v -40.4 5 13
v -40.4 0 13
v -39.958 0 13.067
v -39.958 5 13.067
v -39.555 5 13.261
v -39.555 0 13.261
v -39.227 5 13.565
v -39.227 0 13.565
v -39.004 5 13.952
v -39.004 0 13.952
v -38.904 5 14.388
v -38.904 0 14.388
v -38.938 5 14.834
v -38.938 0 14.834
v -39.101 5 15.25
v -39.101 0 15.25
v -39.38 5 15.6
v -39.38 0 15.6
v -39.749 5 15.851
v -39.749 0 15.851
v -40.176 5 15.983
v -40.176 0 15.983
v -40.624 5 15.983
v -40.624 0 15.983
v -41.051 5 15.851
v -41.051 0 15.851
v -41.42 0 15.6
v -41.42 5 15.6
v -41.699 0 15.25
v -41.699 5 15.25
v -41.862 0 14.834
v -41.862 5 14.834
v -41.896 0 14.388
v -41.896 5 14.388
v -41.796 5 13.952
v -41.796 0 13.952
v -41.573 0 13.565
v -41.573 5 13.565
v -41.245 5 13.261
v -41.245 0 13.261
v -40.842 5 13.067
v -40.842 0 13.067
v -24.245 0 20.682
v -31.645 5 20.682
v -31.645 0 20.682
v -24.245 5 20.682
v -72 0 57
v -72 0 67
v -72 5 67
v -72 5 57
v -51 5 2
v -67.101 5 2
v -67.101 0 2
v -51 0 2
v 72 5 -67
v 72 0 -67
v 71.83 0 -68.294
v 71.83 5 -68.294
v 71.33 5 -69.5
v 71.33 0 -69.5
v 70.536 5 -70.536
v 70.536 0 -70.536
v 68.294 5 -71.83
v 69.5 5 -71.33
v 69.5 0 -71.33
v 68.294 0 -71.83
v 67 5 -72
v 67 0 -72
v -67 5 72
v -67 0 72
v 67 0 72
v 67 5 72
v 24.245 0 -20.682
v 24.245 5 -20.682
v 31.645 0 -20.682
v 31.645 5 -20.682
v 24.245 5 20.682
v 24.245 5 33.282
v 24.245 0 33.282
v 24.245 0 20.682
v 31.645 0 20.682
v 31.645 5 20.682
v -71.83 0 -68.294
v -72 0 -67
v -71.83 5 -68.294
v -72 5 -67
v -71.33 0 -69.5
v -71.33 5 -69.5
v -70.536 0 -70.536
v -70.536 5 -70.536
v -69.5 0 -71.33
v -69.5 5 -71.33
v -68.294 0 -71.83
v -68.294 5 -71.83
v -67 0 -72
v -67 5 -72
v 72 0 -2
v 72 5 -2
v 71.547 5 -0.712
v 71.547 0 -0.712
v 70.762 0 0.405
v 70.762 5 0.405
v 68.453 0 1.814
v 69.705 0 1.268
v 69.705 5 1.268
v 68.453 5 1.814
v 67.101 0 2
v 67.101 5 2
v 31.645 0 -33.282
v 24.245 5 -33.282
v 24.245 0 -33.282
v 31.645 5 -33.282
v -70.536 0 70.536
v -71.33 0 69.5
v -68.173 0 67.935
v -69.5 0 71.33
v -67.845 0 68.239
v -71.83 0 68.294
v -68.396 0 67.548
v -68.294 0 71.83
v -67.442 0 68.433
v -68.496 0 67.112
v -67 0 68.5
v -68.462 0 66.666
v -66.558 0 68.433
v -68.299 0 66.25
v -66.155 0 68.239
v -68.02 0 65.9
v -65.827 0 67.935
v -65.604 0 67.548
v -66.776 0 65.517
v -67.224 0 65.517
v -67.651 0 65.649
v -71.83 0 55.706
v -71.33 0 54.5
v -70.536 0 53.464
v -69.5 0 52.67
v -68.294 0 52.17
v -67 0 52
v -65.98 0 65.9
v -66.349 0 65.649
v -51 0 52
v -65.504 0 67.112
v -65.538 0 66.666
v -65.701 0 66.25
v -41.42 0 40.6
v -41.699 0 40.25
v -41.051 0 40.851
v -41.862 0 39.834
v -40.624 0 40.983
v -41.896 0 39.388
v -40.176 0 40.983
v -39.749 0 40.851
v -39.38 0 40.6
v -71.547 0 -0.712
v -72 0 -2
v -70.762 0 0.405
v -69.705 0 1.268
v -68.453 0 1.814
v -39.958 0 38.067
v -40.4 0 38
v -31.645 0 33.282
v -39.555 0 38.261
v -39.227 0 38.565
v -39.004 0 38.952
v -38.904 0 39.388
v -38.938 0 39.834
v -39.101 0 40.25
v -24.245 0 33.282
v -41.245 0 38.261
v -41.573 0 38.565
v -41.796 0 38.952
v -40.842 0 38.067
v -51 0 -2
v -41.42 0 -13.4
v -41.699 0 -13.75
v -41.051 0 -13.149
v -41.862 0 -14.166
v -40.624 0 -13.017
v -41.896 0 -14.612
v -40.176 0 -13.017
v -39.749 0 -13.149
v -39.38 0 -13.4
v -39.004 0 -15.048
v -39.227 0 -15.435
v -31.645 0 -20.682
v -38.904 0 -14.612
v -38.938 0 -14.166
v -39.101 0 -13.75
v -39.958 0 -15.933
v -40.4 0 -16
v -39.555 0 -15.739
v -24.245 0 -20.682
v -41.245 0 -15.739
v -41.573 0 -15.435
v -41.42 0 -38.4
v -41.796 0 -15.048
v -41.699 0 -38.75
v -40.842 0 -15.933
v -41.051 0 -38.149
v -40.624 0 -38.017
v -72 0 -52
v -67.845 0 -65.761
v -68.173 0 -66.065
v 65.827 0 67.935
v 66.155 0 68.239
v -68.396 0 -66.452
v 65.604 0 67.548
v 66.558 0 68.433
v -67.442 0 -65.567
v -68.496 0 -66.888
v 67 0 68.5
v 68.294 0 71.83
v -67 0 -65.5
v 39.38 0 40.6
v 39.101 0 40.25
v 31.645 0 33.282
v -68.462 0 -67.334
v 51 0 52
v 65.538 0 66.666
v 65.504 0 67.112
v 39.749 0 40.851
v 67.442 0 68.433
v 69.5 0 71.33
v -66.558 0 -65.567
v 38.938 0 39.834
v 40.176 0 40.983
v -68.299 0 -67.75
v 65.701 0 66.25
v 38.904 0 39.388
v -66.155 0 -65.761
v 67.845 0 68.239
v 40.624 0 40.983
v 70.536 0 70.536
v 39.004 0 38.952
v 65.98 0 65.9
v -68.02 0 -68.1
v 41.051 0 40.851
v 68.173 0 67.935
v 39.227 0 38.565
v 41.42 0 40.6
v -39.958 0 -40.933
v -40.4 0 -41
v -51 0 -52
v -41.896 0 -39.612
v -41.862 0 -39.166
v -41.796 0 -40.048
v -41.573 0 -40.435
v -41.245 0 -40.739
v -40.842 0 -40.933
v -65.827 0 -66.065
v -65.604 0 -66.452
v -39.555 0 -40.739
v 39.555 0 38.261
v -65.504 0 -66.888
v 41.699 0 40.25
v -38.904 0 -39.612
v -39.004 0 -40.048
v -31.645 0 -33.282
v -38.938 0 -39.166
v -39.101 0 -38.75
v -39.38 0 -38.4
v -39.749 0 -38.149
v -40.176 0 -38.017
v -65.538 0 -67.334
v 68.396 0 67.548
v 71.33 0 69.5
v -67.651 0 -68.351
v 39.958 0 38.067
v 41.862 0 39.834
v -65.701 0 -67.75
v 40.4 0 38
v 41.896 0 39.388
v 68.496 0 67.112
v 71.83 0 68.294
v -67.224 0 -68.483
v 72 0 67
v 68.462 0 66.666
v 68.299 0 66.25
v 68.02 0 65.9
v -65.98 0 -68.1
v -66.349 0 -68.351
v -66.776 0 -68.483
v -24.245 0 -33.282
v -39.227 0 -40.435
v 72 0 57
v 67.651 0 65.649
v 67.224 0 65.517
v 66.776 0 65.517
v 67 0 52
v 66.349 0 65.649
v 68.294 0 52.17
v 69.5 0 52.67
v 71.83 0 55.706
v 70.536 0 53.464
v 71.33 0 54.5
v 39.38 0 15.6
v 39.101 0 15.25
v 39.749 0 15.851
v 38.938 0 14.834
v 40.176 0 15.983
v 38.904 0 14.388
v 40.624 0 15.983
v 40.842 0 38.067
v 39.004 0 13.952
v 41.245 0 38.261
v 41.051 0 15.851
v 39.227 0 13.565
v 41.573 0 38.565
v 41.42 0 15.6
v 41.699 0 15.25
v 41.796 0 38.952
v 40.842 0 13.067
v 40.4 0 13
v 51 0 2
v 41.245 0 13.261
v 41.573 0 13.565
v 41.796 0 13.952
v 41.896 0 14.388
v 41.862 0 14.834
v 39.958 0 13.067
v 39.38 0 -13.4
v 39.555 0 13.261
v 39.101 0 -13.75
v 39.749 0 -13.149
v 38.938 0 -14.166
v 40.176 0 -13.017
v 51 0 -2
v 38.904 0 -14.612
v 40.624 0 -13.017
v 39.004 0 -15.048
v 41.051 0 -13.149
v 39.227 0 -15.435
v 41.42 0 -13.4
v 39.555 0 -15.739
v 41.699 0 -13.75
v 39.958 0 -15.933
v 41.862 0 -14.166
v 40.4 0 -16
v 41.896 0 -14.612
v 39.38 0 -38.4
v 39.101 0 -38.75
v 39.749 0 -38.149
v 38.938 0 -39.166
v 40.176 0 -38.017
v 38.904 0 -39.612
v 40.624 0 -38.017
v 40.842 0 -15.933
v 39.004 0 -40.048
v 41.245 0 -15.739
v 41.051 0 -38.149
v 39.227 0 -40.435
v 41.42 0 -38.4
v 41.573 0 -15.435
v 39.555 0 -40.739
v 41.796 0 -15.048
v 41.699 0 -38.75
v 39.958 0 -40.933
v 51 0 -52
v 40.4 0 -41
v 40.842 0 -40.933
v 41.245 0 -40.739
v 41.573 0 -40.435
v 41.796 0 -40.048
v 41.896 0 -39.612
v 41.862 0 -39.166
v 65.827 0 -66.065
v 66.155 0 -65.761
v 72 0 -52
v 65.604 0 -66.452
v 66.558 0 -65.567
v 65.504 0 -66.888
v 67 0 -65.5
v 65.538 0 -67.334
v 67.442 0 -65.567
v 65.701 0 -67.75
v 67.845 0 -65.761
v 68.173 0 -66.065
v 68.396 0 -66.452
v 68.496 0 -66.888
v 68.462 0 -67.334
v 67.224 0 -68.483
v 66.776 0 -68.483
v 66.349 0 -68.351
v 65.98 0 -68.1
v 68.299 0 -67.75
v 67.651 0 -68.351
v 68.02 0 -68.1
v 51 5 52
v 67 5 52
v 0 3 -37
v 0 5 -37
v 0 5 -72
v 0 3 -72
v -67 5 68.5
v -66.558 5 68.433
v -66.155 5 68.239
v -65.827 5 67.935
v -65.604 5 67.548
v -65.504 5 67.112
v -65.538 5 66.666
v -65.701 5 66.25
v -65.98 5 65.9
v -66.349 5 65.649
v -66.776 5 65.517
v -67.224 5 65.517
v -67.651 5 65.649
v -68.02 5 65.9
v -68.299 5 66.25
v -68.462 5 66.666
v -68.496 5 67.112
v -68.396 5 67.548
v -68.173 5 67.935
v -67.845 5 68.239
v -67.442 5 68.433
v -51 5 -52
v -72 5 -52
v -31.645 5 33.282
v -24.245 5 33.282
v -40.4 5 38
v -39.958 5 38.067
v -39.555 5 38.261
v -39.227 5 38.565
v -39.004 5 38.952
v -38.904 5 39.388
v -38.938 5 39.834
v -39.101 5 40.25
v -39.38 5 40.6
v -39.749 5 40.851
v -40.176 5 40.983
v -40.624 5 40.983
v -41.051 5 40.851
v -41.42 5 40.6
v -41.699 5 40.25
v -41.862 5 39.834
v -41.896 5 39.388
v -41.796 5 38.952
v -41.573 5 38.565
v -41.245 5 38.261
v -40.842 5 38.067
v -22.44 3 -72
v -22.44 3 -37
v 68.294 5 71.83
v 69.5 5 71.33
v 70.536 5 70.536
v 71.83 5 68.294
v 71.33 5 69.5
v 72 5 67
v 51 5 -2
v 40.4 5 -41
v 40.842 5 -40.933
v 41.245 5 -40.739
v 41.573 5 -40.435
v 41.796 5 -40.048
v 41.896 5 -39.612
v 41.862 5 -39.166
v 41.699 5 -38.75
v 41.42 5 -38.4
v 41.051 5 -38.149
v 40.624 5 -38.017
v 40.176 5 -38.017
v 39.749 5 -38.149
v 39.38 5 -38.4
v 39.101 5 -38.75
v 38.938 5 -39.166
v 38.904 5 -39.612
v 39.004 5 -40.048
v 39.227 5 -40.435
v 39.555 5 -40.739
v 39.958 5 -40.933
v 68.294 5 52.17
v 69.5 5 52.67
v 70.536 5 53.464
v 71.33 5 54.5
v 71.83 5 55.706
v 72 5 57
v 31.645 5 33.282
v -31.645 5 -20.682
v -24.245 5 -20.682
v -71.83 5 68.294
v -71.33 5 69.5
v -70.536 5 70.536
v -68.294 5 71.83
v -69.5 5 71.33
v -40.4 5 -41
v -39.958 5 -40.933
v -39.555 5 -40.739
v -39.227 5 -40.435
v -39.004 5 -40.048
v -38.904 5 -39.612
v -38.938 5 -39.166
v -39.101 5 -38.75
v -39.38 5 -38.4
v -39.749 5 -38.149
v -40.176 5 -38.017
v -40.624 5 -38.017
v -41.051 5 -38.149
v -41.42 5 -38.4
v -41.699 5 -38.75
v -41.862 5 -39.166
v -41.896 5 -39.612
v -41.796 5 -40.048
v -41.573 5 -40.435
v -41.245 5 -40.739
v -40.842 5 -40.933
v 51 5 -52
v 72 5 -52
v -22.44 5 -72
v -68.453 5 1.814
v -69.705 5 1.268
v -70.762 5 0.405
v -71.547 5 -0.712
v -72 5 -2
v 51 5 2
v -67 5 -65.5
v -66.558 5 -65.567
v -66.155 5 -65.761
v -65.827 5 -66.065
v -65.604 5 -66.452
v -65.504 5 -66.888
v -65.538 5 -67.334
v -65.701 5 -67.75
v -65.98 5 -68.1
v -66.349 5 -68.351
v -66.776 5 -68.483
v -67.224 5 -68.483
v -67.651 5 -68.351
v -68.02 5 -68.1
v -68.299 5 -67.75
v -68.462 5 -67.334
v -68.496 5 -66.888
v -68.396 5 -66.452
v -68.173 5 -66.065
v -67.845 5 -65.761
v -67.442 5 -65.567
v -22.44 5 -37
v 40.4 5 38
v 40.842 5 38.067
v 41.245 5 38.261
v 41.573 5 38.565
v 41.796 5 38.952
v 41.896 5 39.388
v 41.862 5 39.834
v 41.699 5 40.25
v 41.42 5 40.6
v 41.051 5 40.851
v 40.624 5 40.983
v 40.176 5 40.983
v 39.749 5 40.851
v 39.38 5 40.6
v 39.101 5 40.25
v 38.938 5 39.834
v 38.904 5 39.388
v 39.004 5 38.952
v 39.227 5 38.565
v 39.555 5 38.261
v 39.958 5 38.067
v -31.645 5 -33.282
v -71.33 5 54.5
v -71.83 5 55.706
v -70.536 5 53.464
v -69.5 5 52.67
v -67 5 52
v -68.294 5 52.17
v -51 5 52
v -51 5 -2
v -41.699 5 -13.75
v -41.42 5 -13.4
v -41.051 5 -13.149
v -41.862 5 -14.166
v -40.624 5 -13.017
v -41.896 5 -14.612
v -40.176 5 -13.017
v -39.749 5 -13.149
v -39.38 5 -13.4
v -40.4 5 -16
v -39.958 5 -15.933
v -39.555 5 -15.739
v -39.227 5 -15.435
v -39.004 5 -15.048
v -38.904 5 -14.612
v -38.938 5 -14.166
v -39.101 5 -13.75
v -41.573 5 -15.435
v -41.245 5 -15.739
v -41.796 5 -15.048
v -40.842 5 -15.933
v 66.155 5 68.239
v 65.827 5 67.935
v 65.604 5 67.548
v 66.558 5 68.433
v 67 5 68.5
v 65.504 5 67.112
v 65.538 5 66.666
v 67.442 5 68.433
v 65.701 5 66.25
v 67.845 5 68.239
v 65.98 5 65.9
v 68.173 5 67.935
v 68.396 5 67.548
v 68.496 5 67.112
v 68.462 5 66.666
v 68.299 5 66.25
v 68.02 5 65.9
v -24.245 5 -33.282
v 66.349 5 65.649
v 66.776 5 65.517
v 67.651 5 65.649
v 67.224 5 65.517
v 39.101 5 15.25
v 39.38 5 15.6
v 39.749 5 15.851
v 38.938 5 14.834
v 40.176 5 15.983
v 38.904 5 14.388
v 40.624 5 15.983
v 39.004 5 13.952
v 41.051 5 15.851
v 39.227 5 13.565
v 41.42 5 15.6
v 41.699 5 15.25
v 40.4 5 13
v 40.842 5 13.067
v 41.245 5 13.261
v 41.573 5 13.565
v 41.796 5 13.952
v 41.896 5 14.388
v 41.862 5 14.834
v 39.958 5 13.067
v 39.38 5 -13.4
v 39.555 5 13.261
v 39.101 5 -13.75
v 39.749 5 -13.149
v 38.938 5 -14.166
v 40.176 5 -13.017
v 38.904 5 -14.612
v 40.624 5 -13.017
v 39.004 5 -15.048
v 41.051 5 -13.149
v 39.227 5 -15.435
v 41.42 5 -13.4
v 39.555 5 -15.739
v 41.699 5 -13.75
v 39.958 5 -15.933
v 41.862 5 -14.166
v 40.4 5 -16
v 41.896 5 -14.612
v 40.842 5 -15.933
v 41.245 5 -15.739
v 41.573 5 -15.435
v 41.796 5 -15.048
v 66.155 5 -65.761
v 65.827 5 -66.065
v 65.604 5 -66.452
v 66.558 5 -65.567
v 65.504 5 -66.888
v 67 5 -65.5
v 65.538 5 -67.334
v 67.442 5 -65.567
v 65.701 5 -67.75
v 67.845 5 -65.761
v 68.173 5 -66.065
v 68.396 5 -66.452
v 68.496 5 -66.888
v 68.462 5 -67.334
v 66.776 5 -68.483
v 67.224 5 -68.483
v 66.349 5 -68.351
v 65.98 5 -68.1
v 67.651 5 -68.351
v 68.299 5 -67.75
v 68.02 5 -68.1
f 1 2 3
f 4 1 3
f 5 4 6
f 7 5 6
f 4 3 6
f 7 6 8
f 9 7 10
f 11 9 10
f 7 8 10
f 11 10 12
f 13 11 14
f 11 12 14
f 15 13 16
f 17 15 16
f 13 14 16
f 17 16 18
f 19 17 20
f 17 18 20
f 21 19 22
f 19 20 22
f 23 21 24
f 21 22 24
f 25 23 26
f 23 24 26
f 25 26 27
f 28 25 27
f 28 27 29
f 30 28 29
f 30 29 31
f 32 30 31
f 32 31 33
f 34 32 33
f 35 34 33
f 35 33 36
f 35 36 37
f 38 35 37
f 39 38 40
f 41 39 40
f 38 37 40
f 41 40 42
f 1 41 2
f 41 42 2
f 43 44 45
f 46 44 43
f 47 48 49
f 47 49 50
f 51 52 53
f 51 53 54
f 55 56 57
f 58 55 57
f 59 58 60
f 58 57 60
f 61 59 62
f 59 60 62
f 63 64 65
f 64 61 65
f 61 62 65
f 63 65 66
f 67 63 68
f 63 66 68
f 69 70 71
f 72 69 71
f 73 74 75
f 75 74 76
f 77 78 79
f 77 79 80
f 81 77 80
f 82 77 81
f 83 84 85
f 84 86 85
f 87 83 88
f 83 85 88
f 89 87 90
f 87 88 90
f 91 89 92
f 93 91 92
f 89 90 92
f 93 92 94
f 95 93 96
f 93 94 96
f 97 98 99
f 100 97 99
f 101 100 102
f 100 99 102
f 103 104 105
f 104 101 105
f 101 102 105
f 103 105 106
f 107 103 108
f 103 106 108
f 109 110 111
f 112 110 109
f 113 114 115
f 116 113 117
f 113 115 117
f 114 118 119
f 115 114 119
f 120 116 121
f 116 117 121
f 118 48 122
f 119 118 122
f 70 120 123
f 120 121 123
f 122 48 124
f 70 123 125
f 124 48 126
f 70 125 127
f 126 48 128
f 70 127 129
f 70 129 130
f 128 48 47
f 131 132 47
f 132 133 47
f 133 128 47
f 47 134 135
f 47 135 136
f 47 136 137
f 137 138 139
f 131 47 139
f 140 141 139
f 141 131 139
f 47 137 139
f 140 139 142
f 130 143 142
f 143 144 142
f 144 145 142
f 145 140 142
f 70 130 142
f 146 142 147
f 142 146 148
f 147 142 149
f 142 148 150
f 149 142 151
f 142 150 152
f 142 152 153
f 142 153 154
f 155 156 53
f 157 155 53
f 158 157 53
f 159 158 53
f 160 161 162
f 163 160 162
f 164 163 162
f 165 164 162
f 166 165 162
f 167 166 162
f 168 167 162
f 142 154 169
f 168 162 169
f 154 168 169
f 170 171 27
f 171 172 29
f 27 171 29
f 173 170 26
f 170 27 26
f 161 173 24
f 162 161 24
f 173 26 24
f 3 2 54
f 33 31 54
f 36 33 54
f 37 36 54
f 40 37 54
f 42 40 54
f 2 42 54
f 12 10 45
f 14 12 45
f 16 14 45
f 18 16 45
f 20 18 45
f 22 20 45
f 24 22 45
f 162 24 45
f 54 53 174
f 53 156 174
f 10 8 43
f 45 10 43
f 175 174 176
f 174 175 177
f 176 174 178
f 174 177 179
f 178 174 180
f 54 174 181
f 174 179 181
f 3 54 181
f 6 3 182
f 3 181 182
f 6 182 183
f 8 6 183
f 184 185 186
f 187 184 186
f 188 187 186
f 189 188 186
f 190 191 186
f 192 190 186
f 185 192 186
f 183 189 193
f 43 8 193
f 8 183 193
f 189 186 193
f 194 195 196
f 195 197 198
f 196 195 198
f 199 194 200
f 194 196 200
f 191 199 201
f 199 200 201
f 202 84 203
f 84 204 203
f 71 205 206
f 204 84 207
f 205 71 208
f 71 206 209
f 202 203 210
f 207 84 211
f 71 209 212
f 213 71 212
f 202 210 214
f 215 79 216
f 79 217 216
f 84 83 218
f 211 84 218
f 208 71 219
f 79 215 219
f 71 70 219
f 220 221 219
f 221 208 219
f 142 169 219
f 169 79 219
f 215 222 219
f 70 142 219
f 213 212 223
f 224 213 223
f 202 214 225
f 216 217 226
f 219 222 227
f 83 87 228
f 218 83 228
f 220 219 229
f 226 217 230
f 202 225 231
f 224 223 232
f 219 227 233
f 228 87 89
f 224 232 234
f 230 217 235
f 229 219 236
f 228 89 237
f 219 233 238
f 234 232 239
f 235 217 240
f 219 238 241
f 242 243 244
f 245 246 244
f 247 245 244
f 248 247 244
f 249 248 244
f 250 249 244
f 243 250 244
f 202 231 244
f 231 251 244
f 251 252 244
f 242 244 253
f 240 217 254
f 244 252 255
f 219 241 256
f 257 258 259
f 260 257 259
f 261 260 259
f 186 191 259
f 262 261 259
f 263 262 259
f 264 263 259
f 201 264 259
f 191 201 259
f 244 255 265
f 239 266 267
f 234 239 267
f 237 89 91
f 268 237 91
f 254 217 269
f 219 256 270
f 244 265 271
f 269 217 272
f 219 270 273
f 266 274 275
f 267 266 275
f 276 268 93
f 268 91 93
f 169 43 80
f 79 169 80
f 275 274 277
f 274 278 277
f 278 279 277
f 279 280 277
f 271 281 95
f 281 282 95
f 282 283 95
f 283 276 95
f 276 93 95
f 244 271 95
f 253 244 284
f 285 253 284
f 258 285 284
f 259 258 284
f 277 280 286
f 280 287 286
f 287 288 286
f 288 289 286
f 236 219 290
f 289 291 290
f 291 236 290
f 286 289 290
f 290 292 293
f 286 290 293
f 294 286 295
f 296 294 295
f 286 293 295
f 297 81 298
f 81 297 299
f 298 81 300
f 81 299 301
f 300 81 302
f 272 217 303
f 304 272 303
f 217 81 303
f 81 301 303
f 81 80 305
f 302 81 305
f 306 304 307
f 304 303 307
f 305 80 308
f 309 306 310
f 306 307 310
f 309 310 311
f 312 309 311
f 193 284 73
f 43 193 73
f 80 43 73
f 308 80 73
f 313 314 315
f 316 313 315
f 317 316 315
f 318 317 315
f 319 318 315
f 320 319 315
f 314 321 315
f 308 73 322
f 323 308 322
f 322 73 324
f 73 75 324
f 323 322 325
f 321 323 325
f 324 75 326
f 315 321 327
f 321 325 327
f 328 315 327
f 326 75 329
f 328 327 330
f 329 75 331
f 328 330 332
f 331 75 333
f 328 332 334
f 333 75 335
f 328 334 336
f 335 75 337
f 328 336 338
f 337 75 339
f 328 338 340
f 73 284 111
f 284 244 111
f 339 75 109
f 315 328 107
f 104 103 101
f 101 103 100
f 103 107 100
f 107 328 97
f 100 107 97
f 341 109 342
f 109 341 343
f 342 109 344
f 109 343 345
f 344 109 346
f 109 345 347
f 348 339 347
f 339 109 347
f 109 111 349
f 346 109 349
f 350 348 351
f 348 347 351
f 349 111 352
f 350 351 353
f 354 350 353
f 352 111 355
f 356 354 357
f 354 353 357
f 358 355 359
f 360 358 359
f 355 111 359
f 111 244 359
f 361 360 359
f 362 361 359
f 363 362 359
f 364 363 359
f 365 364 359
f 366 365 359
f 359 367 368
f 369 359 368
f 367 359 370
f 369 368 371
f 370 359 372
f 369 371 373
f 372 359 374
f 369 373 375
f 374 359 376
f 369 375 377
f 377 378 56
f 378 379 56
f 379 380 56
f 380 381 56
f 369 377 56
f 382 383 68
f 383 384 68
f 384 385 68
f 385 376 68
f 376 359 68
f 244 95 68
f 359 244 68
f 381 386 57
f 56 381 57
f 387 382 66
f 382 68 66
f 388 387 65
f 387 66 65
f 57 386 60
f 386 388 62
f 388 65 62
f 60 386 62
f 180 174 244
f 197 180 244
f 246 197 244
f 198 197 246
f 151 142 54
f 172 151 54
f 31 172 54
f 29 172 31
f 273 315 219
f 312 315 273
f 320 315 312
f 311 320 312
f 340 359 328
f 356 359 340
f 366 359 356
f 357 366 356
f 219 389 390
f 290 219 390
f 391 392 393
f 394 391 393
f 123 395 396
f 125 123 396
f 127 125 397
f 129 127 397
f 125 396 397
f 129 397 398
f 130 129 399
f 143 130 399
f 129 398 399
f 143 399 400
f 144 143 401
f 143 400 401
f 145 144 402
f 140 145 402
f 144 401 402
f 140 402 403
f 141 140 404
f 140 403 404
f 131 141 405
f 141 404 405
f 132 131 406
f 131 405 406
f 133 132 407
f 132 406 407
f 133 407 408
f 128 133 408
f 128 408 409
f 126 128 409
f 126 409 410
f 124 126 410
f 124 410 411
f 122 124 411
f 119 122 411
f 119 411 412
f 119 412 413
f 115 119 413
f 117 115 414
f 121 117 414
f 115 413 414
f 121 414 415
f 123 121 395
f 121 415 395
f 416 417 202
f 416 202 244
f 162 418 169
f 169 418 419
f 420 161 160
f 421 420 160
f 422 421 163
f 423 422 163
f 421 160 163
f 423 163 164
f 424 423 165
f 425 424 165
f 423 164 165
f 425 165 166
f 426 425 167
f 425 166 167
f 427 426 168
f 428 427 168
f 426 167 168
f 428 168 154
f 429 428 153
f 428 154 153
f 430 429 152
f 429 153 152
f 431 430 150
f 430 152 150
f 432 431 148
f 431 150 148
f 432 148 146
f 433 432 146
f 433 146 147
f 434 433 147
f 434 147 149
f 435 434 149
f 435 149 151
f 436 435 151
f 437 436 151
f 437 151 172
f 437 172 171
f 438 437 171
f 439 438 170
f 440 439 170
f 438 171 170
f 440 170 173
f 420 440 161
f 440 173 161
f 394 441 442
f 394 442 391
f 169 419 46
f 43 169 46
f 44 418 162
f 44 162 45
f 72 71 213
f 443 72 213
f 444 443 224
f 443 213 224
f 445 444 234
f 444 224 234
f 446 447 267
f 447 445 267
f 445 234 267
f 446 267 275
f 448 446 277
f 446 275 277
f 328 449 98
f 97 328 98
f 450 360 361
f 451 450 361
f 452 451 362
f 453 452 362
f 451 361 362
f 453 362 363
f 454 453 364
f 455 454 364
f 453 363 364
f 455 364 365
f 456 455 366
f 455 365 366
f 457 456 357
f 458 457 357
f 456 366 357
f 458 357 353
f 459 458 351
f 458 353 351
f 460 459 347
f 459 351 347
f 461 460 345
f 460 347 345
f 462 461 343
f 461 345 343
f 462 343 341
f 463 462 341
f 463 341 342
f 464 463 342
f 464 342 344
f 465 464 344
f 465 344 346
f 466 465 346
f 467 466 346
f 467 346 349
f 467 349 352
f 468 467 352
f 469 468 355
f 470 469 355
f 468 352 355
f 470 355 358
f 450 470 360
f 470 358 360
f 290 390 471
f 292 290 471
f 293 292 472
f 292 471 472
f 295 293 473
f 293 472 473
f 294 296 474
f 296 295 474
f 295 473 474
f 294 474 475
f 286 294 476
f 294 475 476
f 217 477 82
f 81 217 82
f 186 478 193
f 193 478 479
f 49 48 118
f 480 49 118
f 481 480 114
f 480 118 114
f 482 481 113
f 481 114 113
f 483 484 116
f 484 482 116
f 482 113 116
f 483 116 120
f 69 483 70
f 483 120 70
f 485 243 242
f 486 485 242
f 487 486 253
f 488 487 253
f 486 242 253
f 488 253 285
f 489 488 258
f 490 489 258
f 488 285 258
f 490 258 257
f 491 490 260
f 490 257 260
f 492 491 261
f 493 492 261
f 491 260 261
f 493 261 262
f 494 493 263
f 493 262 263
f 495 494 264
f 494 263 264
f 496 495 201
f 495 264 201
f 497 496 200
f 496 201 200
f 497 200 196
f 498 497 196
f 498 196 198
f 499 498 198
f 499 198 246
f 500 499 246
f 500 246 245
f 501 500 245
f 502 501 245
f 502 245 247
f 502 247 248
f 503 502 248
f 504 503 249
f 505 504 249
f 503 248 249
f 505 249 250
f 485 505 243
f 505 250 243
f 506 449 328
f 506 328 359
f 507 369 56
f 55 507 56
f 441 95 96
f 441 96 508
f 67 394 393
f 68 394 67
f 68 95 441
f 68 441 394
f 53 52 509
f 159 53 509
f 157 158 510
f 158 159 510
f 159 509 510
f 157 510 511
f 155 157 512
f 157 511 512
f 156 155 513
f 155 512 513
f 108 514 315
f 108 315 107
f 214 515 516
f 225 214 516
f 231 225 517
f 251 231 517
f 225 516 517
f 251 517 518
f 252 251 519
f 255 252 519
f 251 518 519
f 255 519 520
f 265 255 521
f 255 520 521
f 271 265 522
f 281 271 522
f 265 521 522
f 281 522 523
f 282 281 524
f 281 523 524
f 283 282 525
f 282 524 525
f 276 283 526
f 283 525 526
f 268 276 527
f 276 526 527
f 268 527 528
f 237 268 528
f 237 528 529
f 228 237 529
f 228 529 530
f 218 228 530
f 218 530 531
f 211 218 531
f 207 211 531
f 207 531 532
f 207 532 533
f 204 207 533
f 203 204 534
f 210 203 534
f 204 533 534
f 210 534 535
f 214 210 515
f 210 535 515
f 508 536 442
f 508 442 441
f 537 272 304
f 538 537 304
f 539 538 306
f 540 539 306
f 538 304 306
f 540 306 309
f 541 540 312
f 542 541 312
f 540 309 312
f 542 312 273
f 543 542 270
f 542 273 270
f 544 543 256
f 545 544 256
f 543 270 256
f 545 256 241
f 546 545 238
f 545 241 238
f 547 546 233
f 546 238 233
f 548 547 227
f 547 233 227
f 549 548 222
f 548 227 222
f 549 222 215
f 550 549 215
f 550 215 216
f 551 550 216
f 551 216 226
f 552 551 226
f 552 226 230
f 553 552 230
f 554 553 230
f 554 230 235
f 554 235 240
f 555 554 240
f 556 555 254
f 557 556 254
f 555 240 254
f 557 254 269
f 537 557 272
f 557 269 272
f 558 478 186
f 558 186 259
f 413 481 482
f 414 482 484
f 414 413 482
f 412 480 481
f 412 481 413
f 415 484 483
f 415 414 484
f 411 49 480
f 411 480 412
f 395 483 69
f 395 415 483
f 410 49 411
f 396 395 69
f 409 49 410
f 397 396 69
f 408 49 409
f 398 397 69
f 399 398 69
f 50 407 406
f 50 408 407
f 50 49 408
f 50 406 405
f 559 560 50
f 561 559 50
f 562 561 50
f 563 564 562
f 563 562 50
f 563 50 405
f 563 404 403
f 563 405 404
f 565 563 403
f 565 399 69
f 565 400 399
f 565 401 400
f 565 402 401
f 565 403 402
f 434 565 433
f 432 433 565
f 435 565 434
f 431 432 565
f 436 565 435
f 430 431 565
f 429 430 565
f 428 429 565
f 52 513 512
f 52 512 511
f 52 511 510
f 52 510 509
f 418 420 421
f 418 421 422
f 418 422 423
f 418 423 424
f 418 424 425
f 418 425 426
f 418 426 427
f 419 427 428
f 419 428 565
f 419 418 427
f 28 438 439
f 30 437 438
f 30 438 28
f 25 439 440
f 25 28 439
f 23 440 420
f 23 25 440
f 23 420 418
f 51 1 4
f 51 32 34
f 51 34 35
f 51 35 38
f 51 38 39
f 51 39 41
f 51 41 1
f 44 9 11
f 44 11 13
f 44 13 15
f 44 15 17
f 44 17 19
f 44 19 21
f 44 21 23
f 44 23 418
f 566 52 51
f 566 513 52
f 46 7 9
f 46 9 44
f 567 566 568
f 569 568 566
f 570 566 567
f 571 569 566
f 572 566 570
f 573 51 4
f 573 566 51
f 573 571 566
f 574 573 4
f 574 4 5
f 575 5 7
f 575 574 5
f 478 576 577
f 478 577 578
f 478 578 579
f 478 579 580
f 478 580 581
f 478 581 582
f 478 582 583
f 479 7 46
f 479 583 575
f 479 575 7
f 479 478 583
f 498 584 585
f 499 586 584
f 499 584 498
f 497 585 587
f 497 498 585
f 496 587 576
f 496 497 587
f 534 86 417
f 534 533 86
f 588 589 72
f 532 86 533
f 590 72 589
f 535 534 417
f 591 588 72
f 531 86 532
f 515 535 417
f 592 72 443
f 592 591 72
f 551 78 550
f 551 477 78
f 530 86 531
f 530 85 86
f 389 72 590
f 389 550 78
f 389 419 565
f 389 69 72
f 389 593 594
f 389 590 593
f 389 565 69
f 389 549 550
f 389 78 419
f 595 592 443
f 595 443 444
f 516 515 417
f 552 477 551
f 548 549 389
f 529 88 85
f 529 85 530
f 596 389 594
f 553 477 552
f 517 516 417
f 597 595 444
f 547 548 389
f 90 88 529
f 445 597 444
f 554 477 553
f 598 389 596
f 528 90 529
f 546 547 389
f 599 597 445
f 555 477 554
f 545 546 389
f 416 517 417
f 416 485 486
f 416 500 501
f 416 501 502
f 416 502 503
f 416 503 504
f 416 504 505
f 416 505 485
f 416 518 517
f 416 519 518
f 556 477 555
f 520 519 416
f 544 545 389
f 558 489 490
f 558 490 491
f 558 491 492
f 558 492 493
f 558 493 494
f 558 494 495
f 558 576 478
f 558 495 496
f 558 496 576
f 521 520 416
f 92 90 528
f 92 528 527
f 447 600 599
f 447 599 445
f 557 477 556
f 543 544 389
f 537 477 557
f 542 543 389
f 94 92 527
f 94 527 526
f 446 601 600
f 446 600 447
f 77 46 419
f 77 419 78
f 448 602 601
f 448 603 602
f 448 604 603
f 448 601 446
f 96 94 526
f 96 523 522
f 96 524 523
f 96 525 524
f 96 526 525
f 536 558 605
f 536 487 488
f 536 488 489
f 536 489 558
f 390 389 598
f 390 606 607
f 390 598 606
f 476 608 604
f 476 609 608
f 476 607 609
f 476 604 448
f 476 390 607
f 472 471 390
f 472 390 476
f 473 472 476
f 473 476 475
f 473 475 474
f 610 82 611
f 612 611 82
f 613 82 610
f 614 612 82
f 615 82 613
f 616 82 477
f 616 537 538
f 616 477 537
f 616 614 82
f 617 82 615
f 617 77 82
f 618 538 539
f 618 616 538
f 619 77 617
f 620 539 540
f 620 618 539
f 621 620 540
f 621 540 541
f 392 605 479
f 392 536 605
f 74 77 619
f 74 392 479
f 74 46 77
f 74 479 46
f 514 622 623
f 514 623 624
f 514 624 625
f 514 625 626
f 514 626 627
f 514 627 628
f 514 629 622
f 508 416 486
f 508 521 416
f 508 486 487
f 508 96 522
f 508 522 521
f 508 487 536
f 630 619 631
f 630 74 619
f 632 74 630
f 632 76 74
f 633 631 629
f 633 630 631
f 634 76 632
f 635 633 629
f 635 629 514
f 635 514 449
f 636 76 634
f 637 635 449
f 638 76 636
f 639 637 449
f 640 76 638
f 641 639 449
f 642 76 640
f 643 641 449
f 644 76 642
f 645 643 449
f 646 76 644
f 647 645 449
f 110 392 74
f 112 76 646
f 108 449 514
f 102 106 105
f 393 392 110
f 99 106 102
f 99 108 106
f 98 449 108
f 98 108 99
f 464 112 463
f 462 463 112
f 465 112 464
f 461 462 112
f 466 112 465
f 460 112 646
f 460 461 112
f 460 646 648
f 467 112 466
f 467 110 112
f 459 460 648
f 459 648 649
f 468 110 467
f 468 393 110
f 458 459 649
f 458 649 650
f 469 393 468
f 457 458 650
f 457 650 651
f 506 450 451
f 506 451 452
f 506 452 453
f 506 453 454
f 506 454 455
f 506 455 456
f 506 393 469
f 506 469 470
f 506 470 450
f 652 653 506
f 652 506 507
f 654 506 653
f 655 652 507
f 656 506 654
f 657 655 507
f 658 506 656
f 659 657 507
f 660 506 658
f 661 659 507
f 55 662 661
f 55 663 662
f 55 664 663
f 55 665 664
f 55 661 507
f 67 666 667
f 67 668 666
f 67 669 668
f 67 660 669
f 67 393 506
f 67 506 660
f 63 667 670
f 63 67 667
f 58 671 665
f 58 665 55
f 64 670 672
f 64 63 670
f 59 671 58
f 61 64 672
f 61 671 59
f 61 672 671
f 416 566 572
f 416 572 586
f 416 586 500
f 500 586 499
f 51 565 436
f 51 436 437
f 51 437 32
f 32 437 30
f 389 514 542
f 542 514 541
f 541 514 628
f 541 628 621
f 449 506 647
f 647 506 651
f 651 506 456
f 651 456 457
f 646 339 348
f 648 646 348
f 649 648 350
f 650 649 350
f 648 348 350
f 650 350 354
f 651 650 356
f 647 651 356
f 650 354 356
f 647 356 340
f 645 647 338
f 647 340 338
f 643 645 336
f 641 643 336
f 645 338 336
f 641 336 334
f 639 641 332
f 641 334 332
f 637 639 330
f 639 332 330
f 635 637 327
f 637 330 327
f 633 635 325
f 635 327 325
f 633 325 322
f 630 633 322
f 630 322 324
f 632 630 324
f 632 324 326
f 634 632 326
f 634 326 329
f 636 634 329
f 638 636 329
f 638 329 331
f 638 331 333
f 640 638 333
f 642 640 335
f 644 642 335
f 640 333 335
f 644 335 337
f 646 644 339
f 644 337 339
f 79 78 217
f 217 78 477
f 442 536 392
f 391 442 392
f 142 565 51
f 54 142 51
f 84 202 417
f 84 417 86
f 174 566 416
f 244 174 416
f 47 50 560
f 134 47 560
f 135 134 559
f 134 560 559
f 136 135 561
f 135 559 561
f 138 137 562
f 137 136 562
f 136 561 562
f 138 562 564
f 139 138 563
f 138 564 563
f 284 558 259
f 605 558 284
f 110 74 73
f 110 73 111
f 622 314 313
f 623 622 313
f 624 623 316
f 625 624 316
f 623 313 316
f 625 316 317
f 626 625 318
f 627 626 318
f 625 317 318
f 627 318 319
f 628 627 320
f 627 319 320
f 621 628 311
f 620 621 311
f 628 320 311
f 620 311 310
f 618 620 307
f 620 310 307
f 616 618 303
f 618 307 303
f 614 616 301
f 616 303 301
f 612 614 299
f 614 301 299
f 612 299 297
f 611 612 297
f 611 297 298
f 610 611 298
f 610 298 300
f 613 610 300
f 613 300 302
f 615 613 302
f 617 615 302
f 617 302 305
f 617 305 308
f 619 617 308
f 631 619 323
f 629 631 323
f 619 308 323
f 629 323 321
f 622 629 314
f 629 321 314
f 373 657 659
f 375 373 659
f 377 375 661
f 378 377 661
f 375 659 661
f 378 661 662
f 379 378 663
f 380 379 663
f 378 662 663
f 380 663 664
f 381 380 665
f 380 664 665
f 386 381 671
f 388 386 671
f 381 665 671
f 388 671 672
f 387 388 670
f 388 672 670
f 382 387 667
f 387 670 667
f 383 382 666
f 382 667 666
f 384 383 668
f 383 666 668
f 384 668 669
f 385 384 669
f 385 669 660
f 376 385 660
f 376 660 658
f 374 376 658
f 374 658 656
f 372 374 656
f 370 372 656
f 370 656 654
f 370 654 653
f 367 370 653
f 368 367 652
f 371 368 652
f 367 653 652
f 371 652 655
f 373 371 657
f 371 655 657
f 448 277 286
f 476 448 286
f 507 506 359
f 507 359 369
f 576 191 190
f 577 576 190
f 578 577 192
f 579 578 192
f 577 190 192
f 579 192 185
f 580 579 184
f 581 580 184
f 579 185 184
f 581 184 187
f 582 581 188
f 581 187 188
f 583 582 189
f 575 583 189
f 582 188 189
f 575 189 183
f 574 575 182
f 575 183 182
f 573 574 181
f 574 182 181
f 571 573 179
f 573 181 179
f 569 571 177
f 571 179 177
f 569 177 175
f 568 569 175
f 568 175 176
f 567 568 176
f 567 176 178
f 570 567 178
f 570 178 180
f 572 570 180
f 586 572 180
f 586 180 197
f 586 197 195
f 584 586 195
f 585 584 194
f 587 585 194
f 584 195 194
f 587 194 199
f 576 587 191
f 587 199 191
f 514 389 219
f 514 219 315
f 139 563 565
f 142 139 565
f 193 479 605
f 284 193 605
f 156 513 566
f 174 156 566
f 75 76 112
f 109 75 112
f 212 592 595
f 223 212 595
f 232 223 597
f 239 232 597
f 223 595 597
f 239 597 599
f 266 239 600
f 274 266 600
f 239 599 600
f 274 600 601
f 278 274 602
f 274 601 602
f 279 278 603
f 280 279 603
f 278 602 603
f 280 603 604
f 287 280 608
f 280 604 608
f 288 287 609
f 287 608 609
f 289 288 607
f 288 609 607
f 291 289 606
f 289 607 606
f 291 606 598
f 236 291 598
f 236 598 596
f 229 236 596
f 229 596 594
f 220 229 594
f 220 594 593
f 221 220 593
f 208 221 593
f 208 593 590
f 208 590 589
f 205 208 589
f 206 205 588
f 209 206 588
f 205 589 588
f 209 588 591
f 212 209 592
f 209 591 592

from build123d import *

# Parameters (mm, degrees)
SKETCH1_W           = 144
SKETCH1_H           = 144
BOSS_EXTRUDE1_DEPTH = 5
SKETCH2_W           = 21
SKETCH2_H           = 50
CUT_EXTRUDE1_DEPTH  = 5
SKETCH11_W          = 7.4
SKETCH11_H          = 12.6
CUT_EXTRUDE10_DEPTH = 5
SKETCH13_R          = 1.5
CUT_EXTRUDE12_DEPTH = 5
FILLET1_R           = 5
FILLET2_R           = 5
FILLET3_R           = 5
SKETCH14_R          = 1.5
CUT_EXTRUDE13_DEPTH = 5
SKETCH15_W          = 22.44
SKETCH15_H          = 35
CUT_EXTRUDE14_DEPTH = 2


with BuildPart() as part:
    # Sketch1 → Boss-Extrude1 (new body)
    with BuildSketch(Plane(origin=(0, 0, 0), x_dir=(1, 0, 0), z_dir=(0, 1, 0))):
        Rectangle(SKETCH1_W, SKETCH1_H)
    extrude(amount=BOSS_EXTRUDE1_DEPTH)

    # Sketch2 → Cut-Extrude1 (cut)
    with BuildSketch(Plane(origin=(0, 5, 0), x_dir=(1, 0, 0), z_dir=(0, 1, 0))):
        with Locations((-61.5, -27)):
            Rectangle(SKETCH2_W, SKETCH2_H)
        with Locations((61.5, -27)):
            Rectangle(SKETCH2_W, SKETCH2_H)
        with Locations((61.5, 27)):
            Rectangle(SKETCH2_W, SKETCH2_H)
        with Locations((-61.5, 27)):
            Rectangle(SKETCH2_W, SKETCH2_H)
    extrude(amount=-CUT_EXTRUDE1_DEPTH, mode=Mode.SUBTRACT)

    # Sketch11 → Cut-Extrude10 (cut)
    with BuildSketch(Plane(origin=(0, 5, 0), x_dir=(1, 0, 0), z_dir=(0, 1, 0))):
        with Locations((27.945388191, -26.98248673)):
            Rectangle(SKETCH11_W, SKETCH11_H)
        with Locations((-27.945388191, -26.98248673)):
            Rectangle(SKETCH11_W, SKETCH11_H)
        with Locations((27.945388191, 26.98248673)):
            Rectangle(SKETCH11_W, SKETCH11_H)
        with Locations((-27.945388191, 26.98248673)):
            Rectangle(SKETCH11_W, SKETCH11_H)
    extrude(amount=-CUT_EXTRUDE10_DEPTH, mode=Mode.SUBTRACT)

    # Sketch13 → Cut-Extrude12 (cut)
    with BuildSketch(Plane(origin=(0, 5, 0), x_dir=(1, 0, 0), z_dir=(0, 1, 0))):
        with Locations(Location((-67, 67, 0), (0, 0, 270))):
            Circle(SKETCH13_R)
        with Locations(Location((-67, -67, 0), (0, 0, 270))):
            Circle(SKETCH13_R)
        with Locations(Location((67, 67, 0), (0, 0, 270))):
            Circle(SKETCH13_R)
        with Locations(Location((67, -67, 0), (0, 0, 270))):
            Circle(SKETCH13_R)
    extrude(amount=-CUT_EXTRUDE12_DEPTH, mode=Mode.SUBTRACT)

    # Fillet1
    fillet1_edges = [part.edges().sort_by_distance(p)[0] for p in [
        (-72, 2.5, -72),
    ]]
    fillet(fillet1_edges, radius=FILLET1_R)

    # Fillet2
    # the kernel refuses this fillet: 5 mm, written as the material it takes off along each edge
    with BuildSketch(Plane(origin=(-72, 17.5, 52), x_dir=(1, 0, 0), z_dir=(0, -1, 0))) as fillet2_piece_1:
        with BuildLine():
            CenterArc((FILLET2_R, FILLET2_R), FILLET2_R, 180, 90)
            Line((0, FILLET2_R), (-FILLET2_R * 0.02, FILLET2_R))
            Line((-FILLET2_R * 0.02, FILLET2_R), (-FILLET2_R * 0.02, -FILLET2_R * 0.02))
            Line((-FILLET2_R * 0.02, -FILLET2_R * 0.02), (FILLET2_R, -FILLET2_R * 0.02))
            Line((FILLET2_R, -FILLET2_R * 0.02), (FILLET2_R, 0))
        make_face()
    extrude(amount=30, mode=Mode.SUBTRACT)
    with BuildSketch(Plane(origin=(-72, 17.247448714, 2), x_dir=(1.5631940186717212e-12, 0, -1.0), z_dir=(0, -1, 0))) as fillet2_piece_2:
        with BuildLine():
            CenterArc((5, 4.898979486), FILLET2_R, 180, 78.463040967)
            Line((0, 4.898979486), (-0.1, 4.898979486))
            Line((-0.1, 4.898979486), (-0.1, 0))
            Line((-0.1, 0), (0, -0.1))
            ThreePointArc((0, -0.1), (2, -0.1), (3.98, -0.09797959))
            Line((3.98, -0.09797959), (4, 0))
        make_face()
    extrude(amount=29.494897428, mode=Mode.SUBTRACT)
    with BuildSketch(Plane(origin=(-72, -12.5, 72), x_dir=(0, 0, -1), z_dir=(0, 1, 0))) as fillet2_piece_3:
        with BuildLine():
            CenterArc((FILLET2_R, -FILLET2_R), FILLET2_R, 90, 90)
            Line((0, -FILLET2_R), (-FILLET2_R * 0.02, -FILLET2_R))
            Line((-FILLET2_R * 0.02, -FILLET2_R), (-FILLET2_R * 0.02, FILLET2_R * 0.02))
            Line((-FILLET2_R * 0.02, FILLET2_R * 0.02), (FILLET2_R, FILLET2_R * 0.02))
            Line((FILLET2_R, FILLET2_R * 0.02), (FILLET2_R, 0))
        make_face()
    extrude(amount=30, mode=Mode.SUBTRACT)

    # Fillet3
    # the kernel refuses this fillet: 5 mm, written as the material it takes off along each edge
    with BuildSketch(Plane(origin=(72, 17.247448714, 2), x_dir=(-1, 0, 0), z_dir=(0, -1, 0))) as fillet3_piece_1:
        with BuildLine():
            CenterArc((4.898979486, 5), FILLET3_R, 191.536959033, 78.463040967)
            Line((0, 4), (-0.09797959, 3.98))
            ThreePointArc((-0.09797959, 3.98), (-0.1, 2), (-0.1, 0))
            Line((-0.1, 0), (0, -0.1))
            Line((0, -0.1), (4.898979486, -0.1))
            Line((4.898979486, -0.1), (4.898979486, 0))
        make_face()
    extrude(amount=29.494897428, mode=Mode.SUBTRACT)
    with BuildSketch(Plane(origin=(72, 17.5, 52), x_dir=(0, 0, 1), z_dir=(0, -1, 0)), Plane(origin=(72, -12.5, -72), x_dir=(-1, 0, 0), z_dir=(0, 1, 0))) as fillet3_piece_2:
        with BuildLine():
            CenterArc((FILLET3_R, FILLET3_R), FILLET3_R, 180, 90)
            Line((0, FILLET3_R), (-FILLET3_R * 0.02, FILLET3_R))
            Line((-FILLET3_R * 0.02, FILLET3_R), (-FILLET3_R * 0.02, -FILLET3_R * 0.02))
            Line((-FILLET3_R * 0.02, -FILLET3_R * 0.02), (FILLET3_R, -FILLET3_R * 0.02))
            Line((FILLET3_R, -FILLET3_R * 0.02), (FILLET3_R, 0))
        make_face()
    extrude(amount=30, mode=Mode.SUBTRACT)
    with BuildSketch(Plane(origin=(72, -12.5, 72), x_dir=(-1, 0, 0), z_dir=(0, 1, 0))) as fillet3_piece_3:
        with BuildLine():
            CenterArc((FILLET3_R, -FILLET3_R), FILLET3_R, 90, 90)
            Line((0, -FILLET3_R), (-FILLET3_R * 0.02, -FILLET3_R))
            Line((-FILLET3_R * 0.02, -FILLET3_R), (-FILLET3_R * 0.02, FILLET3_R * 0.02))
            Line((-FILLET3_R * 0.02, FILLET3_R * 0.02), (FILLET3_R, FILLET3_R * 0.02))
            Line((FILLET3_R, FILLET3_R * 0.02), (FILLET3_R, 0))
        make_face()
    extrude(amount=30, mode=Mode.SUBTRACT)

    # Sketch14 → Cut-Extrude13 (cut)
    with BuildSketch(Plane.XZ):
        with Locations(Location((-40.4, 39.5, 0), (0, 0, 270))):
            Circle(SKETCH14_R)
        with Locations(Location((-40.4, 14.5, 0), (0, 0, 270))):
            Circle(SKETCH14_R)
        with Locations(Location((40.4, 39.5, 0), (0, 0, 270))):
            Circle(SKETCH14_R)
        with Locations(Location((40.4, 14.5, 0), (0, 0, 270))):
            Circle(SKETCH14_R)
        with Locations(Location((-40.4, -14.5, 0), (0, 0, 270))):
            Circle(SKETCH14_R)
        with Locations(Location((-40.4, -39.5, 0), (0, 0, 270))):
            Circle(SKETCH14_R)
        with Locations(Location((40.4, -14.5, 0), (0, 0, 270))):
            Circle(SKETCH14_R)
        with Locations(Location((40.4, -39.5, 0), (0, 0, 270))):
            Circle(SKETCH14_R)
    extrude(amount=-CUT_EXTRUDE13_DEPTH, mode=Mode.SUBTRACT)

    # Sketch15 → Cut-Extrude14 (cut)
    with BuildSketch(Plane(origin=(0, 5, 0), x_dir=(1, 0, 0), z_dir=(0, 1, 0))):
        with Locations((-11.22, 54.5)):
            Rectangle(SKETCH15_W, SKETCH15_H)
    extrude(amount=-CUT_EXTRUDE14_DEPTH, mode=Mode.SUBTRACT)


solid = part.part
